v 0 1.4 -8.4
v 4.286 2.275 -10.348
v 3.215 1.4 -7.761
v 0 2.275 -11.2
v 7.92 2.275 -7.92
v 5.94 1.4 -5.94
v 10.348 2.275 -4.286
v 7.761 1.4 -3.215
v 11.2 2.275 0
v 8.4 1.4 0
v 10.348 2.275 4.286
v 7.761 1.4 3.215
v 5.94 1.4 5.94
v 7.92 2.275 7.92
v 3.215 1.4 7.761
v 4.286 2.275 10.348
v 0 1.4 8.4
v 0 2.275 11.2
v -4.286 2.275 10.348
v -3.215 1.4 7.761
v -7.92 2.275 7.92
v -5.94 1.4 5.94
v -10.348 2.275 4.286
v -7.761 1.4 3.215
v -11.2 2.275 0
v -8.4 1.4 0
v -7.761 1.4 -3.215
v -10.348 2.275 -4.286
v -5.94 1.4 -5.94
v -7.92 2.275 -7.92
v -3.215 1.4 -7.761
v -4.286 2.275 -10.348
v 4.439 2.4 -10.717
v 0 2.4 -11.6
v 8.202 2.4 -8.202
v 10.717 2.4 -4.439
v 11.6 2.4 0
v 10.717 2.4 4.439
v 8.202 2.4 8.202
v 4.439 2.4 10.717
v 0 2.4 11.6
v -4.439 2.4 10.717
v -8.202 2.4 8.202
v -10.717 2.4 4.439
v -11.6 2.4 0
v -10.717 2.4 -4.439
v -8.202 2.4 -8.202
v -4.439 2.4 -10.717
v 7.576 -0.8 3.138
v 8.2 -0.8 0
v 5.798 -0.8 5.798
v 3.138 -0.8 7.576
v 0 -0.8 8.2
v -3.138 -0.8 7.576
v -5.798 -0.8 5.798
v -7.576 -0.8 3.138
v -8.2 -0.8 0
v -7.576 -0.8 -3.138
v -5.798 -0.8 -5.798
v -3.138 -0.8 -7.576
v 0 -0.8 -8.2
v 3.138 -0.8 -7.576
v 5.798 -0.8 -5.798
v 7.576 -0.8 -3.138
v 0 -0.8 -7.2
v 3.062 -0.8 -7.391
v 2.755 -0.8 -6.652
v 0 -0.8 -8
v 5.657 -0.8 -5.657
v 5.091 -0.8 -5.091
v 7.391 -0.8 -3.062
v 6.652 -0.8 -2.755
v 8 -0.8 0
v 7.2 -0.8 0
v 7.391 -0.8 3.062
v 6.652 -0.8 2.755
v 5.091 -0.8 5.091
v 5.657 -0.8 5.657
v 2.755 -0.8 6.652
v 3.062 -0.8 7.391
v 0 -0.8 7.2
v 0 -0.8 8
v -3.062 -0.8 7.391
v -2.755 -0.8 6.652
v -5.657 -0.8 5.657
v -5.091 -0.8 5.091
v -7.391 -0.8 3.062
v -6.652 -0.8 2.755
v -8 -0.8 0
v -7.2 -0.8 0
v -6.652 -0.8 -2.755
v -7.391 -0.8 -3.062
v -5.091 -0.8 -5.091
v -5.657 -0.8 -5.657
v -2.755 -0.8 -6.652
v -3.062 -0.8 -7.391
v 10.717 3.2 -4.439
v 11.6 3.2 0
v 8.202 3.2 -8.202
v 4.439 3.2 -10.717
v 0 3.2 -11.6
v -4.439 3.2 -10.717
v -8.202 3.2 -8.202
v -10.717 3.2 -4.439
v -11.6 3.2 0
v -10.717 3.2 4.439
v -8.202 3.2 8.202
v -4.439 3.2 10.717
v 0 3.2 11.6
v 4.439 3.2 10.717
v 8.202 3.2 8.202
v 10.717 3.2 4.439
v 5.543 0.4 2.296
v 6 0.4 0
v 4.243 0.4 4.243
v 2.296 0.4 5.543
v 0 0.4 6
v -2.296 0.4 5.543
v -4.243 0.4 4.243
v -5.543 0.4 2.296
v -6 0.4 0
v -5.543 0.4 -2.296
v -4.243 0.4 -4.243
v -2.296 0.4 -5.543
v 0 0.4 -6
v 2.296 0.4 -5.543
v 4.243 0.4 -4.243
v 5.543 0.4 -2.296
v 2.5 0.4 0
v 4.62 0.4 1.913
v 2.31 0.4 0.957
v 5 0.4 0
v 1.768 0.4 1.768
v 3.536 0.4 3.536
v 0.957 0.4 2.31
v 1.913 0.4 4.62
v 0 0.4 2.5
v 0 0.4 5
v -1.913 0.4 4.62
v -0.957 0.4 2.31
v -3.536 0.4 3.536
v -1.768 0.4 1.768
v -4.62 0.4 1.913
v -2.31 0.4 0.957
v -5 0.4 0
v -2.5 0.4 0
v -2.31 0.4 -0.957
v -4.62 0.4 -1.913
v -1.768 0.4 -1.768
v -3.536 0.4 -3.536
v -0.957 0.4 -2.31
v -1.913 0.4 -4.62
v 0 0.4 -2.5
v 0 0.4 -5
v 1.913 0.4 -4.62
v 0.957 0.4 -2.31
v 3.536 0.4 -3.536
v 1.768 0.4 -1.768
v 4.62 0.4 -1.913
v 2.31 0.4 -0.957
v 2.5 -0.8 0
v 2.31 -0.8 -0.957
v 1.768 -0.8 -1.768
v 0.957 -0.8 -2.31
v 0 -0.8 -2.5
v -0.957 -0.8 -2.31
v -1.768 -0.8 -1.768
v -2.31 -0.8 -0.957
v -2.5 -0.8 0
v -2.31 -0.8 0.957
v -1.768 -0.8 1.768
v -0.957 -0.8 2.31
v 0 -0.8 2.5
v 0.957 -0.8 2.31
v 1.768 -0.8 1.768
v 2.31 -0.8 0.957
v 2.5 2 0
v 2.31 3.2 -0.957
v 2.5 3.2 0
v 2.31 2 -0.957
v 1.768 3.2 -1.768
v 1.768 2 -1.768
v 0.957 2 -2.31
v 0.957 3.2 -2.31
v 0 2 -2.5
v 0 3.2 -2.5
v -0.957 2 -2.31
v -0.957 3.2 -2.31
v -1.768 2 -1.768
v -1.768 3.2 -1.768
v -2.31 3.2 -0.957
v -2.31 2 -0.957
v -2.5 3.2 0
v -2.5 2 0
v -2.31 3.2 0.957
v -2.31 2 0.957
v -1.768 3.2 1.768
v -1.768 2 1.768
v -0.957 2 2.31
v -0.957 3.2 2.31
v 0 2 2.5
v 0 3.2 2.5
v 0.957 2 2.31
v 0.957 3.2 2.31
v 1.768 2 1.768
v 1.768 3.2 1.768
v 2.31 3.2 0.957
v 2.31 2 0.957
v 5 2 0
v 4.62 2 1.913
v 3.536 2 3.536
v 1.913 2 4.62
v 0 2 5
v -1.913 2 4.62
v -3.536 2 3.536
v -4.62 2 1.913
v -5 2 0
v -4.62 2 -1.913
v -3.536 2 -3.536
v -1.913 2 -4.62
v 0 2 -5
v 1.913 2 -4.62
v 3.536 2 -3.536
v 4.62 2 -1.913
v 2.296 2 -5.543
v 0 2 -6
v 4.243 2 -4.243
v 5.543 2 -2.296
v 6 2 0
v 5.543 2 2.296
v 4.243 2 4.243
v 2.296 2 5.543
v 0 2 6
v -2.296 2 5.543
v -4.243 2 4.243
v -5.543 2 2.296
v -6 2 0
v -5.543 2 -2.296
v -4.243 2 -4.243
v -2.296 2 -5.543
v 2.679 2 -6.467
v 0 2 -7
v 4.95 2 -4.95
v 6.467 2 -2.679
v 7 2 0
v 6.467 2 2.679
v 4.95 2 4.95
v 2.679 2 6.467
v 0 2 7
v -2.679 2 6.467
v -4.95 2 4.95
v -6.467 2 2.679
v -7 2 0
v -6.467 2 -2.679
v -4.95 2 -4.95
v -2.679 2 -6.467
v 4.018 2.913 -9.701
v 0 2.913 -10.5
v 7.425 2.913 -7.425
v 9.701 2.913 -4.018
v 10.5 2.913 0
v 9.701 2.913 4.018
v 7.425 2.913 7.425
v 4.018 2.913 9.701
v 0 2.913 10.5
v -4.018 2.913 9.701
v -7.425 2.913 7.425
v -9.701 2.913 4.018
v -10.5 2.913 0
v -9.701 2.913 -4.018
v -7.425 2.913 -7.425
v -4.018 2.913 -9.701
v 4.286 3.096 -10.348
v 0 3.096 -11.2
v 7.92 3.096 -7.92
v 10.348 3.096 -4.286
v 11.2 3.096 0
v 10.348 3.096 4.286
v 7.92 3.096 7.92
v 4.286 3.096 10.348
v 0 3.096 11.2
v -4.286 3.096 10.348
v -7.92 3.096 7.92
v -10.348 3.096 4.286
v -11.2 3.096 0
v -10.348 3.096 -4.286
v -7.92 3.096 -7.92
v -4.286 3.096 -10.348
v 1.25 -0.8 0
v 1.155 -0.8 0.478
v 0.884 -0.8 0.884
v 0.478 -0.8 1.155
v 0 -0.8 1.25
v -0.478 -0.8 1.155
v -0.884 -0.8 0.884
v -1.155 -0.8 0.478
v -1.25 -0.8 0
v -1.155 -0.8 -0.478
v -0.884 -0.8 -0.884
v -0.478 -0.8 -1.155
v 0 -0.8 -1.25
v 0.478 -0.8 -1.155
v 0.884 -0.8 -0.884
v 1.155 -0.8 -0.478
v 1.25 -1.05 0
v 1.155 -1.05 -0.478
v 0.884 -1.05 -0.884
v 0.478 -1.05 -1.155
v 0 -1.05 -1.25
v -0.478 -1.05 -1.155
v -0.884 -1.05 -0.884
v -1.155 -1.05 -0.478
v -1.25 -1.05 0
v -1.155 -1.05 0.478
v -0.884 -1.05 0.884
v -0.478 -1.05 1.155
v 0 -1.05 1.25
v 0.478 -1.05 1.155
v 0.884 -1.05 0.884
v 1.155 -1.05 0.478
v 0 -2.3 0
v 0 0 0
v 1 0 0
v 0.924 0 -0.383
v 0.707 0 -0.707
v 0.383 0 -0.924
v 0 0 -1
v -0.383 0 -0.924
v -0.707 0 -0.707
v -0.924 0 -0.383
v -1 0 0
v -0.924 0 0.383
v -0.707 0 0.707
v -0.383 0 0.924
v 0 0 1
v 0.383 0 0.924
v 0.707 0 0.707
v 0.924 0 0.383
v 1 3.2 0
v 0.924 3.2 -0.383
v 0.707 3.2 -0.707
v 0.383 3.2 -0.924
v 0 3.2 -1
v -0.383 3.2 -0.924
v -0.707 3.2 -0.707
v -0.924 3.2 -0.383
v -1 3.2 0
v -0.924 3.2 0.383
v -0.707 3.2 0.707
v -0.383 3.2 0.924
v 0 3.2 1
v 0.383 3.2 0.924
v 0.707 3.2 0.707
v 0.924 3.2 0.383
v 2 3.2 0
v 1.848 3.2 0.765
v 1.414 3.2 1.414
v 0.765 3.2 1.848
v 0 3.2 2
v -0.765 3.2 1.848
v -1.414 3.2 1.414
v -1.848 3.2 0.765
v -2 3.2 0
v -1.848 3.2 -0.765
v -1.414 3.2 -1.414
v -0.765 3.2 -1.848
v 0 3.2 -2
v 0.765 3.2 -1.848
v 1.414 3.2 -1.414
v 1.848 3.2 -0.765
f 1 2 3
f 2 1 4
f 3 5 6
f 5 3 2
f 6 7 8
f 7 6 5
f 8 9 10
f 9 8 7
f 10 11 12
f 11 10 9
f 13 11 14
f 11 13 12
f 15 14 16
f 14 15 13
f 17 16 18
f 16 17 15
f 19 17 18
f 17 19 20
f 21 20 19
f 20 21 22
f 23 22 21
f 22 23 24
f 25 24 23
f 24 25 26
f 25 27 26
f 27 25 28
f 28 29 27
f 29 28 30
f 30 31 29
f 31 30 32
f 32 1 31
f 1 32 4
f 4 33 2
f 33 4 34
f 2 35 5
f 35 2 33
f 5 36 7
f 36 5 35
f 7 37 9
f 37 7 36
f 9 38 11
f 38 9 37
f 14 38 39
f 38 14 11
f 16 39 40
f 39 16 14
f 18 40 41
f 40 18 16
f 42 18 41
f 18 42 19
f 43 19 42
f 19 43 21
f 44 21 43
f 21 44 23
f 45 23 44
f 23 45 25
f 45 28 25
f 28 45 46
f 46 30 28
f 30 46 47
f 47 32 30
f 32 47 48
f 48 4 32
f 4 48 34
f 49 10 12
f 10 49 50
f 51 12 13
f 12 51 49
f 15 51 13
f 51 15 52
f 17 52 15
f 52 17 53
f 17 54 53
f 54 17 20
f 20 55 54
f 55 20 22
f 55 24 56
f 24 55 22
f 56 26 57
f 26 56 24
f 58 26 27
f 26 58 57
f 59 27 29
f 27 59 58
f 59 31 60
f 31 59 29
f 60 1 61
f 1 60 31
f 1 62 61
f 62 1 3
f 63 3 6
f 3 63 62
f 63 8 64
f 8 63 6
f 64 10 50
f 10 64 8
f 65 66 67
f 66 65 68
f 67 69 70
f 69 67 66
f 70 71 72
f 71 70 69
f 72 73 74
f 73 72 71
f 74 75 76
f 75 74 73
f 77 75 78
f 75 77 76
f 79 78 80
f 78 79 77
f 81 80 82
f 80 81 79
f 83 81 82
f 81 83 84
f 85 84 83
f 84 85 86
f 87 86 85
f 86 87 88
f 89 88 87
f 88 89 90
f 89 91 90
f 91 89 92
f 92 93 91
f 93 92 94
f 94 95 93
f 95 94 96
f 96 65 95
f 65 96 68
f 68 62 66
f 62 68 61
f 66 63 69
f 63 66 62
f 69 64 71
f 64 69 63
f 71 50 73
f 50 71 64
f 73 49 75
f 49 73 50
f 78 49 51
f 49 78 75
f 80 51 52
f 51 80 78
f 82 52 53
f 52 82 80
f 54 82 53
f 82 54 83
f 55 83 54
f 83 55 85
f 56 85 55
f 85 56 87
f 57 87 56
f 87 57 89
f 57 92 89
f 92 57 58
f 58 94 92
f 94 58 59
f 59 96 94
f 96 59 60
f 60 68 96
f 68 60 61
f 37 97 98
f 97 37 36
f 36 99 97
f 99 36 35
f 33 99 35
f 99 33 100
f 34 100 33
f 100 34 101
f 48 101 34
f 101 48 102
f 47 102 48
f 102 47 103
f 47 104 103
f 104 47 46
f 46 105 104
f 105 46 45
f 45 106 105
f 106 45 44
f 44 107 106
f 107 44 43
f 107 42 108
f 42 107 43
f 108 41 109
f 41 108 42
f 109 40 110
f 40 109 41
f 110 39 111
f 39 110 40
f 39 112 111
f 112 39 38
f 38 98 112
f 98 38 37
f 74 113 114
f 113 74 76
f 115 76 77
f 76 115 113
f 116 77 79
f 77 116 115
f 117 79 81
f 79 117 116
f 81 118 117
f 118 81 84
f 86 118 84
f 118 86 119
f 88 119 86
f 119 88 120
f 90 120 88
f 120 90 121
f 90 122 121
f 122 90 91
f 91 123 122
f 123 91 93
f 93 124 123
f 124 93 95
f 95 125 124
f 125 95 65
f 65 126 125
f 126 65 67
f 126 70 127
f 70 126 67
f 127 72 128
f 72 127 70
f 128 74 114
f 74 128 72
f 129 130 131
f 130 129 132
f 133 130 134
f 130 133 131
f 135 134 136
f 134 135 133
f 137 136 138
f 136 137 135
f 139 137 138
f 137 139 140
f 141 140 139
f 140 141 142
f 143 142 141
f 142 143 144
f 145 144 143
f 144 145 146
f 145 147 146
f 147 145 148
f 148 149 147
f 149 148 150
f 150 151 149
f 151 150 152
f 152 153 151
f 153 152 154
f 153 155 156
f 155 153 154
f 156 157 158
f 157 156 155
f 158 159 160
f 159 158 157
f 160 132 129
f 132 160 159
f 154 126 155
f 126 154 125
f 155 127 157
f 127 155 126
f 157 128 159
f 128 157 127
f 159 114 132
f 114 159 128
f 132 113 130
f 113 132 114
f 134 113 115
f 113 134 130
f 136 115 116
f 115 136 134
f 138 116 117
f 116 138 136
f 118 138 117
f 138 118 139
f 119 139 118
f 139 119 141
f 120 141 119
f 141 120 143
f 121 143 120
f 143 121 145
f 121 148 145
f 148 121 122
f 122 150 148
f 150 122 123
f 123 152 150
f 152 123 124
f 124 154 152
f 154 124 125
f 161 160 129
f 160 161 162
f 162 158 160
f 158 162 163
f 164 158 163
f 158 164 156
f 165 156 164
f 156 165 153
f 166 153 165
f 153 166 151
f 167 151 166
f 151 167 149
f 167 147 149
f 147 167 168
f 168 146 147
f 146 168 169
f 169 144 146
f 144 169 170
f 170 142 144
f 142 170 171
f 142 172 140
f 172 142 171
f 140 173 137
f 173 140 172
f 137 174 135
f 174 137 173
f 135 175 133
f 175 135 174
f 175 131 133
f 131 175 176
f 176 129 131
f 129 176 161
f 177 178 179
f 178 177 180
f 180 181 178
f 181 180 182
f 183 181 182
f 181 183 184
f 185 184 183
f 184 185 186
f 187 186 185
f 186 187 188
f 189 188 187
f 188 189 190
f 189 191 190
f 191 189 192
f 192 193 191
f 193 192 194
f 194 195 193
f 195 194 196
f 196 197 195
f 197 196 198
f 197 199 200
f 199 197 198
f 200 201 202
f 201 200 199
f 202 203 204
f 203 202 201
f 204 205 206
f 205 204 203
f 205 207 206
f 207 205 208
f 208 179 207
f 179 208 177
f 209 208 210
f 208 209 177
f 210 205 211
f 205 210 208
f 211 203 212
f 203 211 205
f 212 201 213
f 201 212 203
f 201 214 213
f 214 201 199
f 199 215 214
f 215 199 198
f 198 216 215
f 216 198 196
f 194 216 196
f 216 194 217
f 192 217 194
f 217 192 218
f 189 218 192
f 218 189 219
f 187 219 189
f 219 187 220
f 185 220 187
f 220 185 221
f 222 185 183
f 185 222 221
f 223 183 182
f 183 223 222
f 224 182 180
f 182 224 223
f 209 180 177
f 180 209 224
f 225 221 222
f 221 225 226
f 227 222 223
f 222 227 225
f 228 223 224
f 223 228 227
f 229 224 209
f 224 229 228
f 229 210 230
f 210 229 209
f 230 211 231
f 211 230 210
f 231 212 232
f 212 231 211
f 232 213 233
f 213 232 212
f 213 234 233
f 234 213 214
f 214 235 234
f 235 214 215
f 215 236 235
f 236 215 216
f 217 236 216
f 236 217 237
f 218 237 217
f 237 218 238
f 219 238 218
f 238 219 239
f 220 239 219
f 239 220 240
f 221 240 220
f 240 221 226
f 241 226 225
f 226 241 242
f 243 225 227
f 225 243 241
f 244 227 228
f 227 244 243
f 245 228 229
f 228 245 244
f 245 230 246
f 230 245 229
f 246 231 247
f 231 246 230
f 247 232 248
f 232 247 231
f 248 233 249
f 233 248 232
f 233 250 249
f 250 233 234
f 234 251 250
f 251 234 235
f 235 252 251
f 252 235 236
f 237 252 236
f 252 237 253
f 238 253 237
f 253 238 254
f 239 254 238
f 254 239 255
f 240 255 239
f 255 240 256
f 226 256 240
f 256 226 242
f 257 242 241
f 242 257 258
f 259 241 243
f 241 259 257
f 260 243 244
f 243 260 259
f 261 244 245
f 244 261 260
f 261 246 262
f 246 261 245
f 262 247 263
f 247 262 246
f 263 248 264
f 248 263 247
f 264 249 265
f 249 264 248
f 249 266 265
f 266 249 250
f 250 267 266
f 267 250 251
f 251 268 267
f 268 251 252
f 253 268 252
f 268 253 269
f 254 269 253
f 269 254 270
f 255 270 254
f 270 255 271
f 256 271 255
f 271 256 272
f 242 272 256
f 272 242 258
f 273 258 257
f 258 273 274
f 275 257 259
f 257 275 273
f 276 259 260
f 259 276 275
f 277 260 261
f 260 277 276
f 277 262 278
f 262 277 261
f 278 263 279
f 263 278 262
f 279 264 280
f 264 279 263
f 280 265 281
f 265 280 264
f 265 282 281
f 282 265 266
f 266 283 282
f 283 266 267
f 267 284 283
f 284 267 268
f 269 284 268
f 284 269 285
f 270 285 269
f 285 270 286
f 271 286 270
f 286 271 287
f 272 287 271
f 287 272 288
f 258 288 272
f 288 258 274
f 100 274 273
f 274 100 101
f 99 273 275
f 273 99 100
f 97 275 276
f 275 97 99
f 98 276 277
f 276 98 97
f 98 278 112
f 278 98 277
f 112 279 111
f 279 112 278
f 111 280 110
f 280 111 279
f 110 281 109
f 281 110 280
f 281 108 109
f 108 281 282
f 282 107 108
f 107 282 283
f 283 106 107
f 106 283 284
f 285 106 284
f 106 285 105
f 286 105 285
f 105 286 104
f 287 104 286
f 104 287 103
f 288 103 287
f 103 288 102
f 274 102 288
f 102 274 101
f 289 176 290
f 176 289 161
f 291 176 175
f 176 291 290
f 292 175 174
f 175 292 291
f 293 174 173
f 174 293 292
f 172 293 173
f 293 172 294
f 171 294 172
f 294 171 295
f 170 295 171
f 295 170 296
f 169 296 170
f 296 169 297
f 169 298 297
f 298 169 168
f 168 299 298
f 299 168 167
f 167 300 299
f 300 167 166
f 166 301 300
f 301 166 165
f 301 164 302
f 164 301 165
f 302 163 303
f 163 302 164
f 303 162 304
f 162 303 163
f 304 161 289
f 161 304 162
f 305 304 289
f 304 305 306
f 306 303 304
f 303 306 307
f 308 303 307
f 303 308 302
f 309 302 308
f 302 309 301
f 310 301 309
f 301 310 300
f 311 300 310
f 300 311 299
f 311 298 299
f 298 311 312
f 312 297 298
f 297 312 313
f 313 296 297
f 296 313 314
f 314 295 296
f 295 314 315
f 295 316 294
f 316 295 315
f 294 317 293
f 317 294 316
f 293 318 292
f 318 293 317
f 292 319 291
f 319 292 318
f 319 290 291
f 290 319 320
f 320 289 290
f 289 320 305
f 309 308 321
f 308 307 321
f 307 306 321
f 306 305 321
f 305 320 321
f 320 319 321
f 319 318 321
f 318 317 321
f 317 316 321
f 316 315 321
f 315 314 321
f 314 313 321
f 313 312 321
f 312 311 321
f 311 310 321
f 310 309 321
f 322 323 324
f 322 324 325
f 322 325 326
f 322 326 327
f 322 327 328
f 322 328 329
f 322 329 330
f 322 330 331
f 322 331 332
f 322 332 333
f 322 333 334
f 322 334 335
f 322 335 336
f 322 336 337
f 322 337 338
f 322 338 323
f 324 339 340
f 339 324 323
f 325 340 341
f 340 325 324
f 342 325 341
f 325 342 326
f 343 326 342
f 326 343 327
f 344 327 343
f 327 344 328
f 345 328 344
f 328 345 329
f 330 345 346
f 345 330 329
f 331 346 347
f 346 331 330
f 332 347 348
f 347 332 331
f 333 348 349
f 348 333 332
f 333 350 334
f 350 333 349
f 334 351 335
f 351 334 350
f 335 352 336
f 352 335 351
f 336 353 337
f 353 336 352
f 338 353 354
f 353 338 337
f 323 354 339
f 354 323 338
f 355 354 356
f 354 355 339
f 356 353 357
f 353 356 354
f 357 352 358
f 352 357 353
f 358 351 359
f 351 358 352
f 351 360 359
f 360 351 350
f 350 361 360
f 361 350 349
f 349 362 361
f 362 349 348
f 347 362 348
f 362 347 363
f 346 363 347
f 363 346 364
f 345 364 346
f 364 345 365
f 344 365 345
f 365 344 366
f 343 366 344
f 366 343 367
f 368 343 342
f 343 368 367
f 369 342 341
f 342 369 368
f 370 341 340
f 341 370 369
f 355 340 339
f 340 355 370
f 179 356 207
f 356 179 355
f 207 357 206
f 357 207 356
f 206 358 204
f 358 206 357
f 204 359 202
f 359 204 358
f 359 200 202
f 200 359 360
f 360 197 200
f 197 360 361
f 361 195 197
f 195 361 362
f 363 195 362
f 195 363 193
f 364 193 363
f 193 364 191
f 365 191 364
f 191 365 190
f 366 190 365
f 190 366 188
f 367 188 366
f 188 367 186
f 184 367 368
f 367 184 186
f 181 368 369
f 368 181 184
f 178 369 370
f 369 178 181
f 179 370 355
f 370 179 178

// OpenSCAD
use <../lib.scad>
use <../p/4-4con0.scad>
use <../p/4-4cylc.scad>
use <../p/4-4cylo.scad>
use <../p/4-4ring1.scad>
use <../p/4-4ring4.scad>
use <s/2879s01.scad>
function ldraw_lib__57878() = [
// 0 Train Wheel with Closed Centre for Wheel Bogie
// 0 Name: 57878.dat
// 0 Author: Max Martin Richter [MMR1988]
// 0 !LDRAW_ORG Part UPDATE 2013-02
// 0 !LICENSE Licensed under CC BY 2.0 and CC BY 4.0 : see CAreadme.txt
// 
// 0 BFC CERTIFY CCW
  [0,"BFC","CERTIFY"],
  [0,"BFC","CCW"],
// 
// 0 !HISTORY 2013-12-23 [PTadmin] Official Update 2013-02
// 
// 
// 1 16 0 0 0 1 0 0 0 1 0 0 0 1 s\2879s01.dat
  [1,16,0,0,0,1,0,0,0,1,0,0,0,1, ldraw_lib__s__2879s01()],
// 
// 1 16 0 0 -2 0 0 3.125 3.125 0 0 0 1 0 4-4ring1.dat
  [1,16,0,0,-2,0,0,3.125,3.125,0,0,0,1,0, ldraw_lib__4_4ring1()],
// 1 16 0 0 -2 3.125 0 0 0 0 3.125 0 -0.625 0 4-4cylo.dat
  [1,16,0,0,-2,3.125,0,0,0,0,3.125,0,-0.625,0, ldraw_lib__4_4cylo()],
// 1 16 0 0 -2.625 0 0 3.125 3.125 0 0 0 -3.125 0 4-4con0.dat
  [1,16,0,0,-2.625,0,0,3.125,3.125,0,0,0,-3.125,0, ldraw_lib__4_4con0()],
// 
// 0 BFC INVERTNEXT
  [0,"BFC","INVERTNEXT"],
// 1 16 0 0 0 2.5 0 0 0 0 2.5 0 8 0 4-4cylc.dat
  [1,16,0,0,0,2.5,0,0,0,0,2.5,0,8,0, ldraw_lib__4_4cylc()],
// 
// 1 16 0 0 8 0 0 2.5 2.5 0 0 0 -1 0 4-4ring1.dat
  [1,16,0,0,8,0,0,2.5,2.5,0,0,0,-1,0, ldraw_lib__4_4ring1()],
// 1 16 0 0 8 0 0 1.25 1.25 0 0 0 -1 0 4-4ring4.dat
  [1,16,0,0,8,0,0,1.25,1.25,0,0,0,-1,0, ldraw_lib__4_4ring4()],
];
makepoly(ldraw_lib__57878(), line=0.2);
